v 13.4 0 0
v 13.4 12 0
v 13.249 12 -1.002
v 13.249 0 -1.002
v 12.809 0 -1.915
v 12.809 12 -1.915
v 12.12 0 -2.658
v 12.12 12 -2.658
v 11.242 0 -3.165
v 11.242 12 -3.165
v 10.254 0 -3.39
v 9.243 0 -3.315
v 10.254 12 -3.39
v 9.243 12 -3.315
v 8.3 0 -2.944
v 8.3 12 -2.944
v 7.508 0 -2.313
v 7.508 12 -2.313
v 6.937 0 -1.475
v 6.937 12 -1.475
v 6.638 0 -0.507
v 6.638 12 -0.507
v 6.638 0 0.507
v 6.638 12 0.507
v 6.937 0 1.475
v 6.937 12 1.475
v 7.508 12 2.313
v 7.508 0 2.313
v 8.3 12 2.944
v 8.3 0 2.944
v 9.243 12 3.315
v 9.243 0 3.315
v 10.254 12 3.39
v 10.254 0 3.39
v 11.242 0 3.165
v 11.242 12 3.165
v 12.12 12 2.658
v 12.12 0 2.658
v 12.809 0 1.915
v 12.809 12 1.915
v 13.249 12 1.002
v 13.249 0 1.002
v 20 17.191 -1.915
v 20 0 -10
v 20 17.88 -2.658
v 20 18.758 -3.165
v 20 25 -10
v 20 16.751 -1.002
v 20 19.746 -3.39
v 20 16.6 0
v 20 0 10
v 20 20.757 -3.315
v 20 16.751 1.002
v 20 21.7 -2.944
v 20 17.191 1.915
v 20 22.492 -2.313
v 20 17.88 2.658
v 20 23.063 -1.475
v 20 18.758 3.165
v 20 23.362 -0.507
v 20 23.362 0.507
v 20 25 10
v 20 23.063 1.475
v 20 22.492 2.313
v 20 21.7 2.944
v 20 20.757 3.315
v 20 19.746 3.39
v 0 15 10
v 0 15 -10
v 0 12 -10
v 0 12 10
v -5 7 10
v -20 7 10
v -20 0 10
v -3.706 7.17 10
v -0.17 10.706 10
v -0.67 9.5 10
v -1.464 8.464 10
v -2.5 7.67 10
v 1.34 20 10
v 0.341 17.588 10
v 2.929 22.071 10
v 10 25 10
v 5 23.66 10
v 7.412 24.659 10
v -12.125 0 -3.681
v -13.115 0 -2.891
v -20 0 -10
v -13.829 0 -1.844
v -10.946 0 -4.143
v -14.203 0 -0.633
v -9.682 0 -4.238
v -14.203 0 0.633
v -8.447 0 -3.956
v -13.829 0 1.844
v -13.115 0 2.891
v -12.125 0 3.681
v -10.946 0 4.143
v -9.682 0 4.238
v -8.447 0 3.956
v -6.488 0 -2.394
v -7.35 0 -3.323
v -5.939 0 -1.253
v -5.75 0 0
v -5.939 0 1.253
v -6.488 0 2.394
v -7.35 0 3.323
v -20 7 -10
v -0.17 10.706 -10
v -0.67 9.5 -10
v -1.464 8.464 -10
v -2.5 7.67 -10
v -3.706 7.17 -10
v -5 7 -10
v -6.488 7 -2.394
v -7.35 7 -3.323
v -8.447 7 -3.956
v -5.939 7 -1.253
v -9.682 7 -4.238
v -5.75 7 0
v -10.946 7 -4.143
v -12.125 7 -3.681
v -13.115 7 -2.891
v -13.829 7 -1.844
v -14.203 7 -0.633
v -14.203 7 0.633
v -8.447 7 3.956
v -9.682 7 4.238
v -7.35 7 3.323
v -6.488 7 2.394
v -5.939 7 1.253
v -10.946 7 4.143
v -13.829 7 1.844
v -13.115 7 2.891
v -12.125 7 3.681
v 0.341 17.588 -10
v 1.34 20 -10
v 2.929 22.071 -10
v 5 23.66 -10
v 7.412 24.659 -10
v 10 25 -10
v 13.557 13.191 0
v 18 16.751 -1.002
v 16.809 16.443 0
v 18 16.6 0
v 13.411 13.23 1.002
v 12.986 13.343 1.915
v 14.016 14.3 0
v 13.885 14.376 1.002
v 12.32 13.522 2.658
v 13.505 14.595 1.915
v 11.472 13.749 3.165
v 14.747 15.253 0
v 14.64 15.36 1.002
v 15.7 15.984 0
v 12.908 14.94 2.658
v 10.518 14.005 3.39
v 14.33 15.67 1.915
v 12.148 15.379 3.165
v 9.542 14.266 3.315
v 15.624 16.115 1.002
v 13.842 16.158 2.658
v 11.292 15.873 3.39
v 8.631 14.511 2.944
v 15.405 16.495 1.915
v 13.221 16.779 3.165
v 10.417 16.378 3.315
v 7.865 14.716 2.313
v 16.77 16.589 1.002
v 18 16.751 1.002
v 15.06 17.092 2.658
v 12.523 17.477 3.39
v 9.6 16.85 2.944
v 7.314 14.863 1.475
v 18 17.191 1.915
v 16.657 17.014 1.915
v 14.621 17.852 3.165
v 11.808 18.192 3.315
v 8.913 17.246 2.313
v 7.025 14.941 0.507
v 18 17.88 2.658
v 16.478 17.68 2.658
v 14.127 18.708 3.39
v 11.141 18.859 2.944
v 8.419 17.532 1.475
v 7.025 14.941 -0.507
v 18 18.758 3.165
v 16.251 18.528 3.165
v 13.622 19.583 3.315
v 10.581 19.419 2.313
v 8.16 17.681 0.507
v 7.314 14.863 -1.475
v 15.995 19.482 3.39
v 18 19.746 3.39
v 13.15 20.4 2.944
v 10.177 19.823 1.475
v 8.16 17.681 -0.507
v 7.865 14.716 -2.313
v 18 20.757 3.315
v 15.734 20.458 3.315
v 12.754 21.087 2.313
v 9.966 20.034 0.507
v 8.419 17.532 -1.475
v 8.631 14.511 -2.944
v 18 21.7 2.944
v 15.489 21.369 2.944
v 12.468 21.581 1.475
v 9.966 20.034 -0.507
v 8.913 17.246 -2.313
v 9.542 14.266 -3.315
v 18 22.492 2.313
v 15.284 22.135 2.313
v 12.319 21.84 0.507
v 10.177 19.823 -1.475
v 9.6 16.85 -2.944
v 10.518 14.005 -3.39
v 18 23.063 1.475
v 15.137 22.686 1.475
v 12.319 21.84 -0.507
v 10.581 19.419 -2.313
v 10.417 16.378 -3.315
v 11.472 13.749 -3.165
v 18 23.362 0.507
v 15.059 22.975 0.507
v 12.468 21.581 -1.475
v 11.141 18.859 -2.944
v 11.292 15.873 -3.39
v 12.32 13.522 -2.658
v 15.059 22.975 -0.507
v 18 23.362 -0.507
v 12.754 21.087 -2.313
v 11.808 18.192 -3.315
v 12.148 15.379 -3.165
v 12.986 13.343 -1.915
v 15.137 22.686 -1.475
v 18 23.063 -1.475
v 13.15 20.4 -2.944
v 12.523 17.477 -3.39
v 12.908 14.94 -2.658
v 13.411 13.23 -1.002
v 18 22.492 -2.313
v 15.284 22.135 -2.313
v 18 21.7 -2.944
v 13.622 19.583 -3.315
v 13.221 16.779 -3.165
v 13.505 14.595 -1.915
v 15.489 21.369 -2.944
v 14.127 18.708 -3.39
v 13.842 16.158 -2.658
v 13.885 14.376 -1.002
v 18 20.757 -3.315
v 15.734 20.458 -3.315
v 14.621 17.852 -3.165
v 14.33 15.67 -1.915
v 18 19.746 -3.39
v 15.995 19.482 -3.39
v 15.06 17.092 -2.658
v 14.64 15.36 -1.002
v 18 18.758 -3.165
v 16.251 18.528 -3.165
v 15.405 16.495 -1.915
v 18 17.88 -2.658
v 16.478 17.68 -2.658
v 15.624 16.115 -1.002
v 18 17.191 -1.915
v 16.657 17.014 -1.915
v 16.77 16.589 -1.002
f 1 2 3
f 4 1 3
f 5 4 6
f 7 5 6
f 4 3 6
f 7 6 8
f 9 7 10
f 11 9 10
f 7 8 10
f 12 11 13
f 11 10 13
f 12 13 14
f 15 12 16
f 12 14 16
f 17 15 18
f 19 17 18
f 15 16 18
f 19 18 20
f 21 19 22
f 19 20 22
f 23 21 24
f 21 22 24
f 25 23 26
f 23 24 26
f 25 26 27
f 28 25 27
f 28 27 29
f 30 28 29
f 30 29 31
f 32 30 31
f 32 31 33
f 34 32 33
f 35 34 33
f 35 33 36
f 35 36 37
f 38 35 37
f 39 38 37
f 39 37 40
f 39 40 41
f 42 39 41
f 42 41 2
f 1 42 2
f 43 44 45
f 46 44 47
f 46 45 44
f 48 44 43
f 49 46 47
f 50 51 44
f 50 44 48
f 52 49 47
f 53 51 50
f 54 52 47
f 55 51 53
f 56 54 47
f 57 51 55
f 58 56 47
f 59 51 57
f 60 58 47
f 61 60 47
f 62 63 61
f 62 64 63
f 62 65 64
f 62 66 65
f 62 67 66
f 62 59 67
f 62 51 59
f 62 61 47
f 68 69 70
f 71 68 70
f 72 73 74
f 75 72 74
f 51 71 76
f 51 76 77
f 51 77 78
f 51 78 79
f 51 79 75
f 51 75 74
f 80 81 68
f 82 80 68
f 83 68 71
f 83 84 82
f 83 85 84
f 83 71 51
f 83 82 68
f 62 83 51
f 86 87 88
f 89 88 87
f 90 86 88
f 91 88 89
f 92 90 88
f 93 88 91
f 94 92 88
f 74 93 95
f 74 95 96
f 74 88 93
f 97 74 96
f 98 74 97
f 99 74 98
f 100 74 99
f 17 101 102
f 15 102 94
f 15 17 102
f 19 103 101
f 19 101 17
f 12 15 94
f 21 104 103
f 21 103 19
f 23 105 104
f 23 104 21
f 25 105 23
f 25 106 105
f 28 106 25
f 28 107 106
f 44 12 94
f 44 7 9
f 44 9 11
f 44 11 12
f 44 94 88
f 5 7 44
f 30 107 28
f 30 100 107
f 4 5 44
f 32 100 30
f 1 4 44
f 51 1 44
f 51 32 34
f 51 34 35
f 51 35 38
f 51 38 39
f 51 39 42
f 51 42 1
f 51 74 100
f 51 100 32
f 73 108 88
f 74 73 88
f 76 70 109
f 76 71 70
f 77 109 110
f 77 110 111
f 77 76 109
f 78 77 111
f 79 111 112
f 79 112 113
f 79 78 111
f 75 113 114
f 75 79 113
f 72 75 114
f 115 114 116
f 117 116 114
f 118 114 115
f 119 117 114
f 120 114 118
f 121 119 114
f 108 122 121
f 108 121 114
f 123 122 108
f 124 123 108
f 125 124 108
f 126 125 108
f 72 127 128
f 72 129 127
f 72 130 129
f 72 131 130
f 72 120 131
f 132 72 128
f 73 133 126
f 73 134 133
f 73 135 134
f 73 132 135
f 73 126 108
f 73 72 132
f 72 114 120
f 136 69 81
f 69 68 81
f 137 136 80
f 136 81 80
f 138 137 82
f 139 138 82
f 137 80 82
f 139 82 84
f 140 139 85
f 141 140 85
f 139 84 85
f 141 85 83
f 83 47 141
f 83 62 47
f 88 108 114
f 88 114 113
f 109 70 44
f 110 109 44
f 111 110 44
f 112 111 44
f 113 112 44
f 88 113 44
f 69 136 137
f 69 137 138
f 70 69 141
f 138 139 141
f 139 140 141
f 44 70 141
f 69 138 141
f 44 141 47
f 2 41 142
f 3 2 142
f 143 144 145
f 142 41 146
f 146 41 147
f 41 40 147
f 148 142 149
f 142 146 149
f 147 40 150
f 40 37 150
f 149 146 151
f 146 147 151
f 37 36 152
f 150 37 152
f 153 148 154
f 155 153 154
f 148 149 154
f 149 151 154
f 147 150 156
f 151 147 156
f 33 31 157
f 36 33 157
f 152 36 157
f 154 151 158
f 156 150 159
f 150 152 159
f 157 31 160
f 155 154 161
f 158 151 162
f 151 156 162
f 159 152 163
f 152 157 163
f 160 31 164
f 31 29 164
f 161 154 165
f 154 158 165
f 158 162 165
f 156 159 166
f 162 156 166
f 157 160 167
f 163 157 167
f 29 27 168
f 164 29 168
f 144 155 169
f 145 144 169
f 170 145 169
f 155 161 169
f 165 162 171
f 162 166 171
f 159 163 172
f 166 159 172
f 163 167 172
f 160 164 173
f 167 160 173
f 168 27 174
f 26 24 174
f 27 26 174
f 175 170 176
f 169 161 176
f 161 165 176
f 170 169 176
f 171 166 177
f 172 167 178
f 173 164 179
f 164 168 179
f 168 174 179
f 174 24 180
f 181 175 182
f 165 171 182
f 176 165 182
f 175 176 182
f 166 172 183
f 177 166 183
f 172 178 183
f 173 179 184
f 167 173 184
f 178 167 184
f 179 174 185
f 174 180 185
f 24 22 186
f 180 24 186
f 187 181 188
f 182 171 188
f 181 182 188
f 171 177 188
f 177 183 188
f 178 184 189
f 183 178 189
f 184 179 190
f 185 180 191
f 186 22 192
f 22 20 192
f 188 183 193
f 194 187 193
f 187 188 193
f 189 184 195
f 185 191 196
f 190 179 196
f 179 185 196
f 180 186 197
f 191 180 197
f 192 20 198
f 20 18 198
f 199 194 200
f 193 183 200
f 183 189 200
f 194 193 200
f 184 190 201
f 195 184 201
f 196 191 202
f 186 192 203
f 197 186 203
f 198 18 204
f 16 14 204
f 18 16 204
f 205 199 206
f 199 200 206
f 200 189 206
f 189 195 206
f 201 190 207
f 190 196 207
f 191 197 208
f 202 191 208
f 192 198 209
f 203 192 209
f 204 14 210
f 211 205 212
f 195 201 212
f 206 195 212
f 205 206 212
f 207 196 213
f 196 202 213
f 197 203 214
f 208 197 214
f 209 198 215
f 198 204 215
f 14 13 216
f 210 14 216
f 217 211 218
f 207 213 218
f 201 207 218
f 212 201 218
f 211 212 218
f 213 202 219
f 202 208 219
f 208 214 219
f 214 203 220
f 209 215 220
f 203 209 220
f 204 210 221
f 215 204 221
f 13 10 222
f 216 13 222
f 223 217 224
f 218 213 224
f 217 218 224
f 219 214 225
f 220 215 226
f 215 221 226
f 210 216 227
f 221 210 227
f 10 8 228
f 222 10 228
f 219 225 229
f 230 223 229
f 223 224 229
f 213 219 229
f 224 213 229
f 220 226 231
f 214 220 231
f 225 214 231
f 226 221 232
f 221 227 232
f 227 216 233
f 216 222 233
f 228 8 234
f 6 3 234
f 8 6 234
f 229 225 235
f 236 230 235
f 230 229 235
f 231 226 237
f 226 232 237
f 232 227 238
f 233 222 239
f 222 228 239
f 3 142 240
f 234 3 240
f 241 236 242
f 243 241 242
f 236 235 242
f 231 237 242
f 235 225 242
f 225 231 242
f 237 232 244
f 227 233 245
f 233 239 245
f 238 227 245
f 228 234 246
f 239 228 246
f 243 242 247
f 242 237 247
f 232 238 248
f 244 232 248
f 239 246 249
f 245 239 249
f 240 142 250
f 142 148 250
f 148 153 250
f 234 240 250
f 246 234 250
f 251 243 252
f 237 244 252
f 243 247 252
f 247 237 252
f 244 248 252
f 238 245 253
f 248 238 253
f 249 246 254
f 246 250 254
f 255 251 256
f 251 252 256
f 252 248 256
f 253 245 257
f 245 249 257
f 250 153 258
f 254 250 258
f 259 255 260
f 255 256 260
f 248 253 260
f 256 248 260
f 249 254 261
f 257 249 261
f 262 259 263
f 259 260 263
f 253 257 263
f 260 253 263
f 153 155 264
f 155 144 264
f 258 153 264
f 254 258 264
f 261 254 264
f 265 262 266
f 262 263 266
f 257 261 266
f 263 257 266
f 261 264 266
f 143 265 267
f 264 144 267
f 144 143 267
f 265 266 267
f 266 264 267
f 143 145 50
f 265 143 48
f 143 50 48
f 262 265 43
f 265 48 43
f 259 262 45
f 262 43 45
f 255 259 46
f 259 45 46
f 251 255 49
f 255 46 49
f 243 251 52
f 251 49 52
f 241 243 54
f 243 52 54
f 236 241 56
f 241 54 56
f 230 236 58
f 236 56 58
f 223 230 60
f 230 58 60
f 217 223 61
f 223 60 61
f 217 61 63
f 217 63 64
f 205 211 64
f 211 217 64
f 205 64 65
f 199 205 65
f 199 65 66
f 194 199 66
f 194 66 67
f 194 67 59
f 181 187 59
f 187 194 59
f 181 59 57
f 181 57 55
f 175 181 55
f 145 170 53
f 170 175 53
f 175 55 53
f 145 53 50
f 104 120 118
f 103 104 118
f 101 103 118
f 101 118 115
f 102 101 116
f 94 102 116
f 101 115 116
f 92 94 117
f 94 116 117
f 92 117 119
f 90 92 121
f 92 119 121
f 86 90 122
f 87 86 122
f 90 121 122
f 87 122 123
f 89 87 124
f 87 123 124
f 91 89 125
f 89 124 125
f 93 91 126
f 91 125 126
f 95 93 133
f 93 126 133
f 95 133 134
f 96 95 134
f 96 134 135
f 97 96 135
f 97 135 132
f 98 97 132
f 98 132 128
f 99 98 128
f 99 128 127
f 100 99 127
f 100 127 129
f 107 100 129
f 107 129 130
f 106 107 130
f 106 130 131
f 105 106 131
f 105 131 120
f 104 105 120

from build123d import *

# Parameters (mm, degrees)
EXTRUDE_1_DEPTH     = 10
SKETCH_2_R          = 4.25
CUT_EXTRUDE_1_DEPTH = 8
SKETCH_4_R          = 3.4
FILLET_1_R          = 5
FILLET_2_R          = 10


with BuildPart() as part:
    # 草圖1 → 填料-伸長1 (new body, symmetric)
    with BuildSketch(Plane.XY):
        Polygon((20, 0), (20, 25), (0, 25), (0, 7), (-20, 7), (-20, 0), align=None)
    extrude(amount=EXTRUDE_1_DEPTH, both=True)

    # 草圖2 → 除料-伸長1 (cut, through all)
    with BuildSketch(Plane(origin=(0, 7, 0), x_dir=(1, 0, 0), z_dir=(0, 1, 0))):
        with Locations((-10, 0)):
            Circle(SKETCH_2_R)
    extrude(amount=-CUT_EXTRUDE_1_DEPTH, mode=Mode.SUBTRACT)

    # 除料-掃出1: sweep along a path in 草圖5
    with BuildLine(Plane(origin=(20, 0, 0), x_dir=(-1, 0, 0), z_dir=(0, 0, -1))) as sweep_1_path:
        Line((10, 0), (10, 12))
        ThreePointArc((10, 12), (7.656854249, 17.656854249), (2, 20))
        Line((2, 20), (0, 20))
    # 草圖4 → 除料-掃出1 (sweep, cut)
    with BuildSketch(Plane.XZ):
        with Locations((10, 0)):
            Circle(SKETCH_4_R)
    sweep(path=sweep_1_path.line, mode=Mode.SUBTRACT)

    # 圓角1
    fillet_1_edges = [part.edges().sort_by_distance(p)[0] for p in [
        (0, 7, 0),
    ]]
    fillet(fillet_1_edges, radius=FILLET_1_R)

    # 圓角2
    fillet_2_edges = [part.edges().sort_by_distance(p)[0] for p in [
        (0, 25, 0),
    ]]
    fillet(fillet_2_edges, radius=FILLET_2_R)


solid = part.part
